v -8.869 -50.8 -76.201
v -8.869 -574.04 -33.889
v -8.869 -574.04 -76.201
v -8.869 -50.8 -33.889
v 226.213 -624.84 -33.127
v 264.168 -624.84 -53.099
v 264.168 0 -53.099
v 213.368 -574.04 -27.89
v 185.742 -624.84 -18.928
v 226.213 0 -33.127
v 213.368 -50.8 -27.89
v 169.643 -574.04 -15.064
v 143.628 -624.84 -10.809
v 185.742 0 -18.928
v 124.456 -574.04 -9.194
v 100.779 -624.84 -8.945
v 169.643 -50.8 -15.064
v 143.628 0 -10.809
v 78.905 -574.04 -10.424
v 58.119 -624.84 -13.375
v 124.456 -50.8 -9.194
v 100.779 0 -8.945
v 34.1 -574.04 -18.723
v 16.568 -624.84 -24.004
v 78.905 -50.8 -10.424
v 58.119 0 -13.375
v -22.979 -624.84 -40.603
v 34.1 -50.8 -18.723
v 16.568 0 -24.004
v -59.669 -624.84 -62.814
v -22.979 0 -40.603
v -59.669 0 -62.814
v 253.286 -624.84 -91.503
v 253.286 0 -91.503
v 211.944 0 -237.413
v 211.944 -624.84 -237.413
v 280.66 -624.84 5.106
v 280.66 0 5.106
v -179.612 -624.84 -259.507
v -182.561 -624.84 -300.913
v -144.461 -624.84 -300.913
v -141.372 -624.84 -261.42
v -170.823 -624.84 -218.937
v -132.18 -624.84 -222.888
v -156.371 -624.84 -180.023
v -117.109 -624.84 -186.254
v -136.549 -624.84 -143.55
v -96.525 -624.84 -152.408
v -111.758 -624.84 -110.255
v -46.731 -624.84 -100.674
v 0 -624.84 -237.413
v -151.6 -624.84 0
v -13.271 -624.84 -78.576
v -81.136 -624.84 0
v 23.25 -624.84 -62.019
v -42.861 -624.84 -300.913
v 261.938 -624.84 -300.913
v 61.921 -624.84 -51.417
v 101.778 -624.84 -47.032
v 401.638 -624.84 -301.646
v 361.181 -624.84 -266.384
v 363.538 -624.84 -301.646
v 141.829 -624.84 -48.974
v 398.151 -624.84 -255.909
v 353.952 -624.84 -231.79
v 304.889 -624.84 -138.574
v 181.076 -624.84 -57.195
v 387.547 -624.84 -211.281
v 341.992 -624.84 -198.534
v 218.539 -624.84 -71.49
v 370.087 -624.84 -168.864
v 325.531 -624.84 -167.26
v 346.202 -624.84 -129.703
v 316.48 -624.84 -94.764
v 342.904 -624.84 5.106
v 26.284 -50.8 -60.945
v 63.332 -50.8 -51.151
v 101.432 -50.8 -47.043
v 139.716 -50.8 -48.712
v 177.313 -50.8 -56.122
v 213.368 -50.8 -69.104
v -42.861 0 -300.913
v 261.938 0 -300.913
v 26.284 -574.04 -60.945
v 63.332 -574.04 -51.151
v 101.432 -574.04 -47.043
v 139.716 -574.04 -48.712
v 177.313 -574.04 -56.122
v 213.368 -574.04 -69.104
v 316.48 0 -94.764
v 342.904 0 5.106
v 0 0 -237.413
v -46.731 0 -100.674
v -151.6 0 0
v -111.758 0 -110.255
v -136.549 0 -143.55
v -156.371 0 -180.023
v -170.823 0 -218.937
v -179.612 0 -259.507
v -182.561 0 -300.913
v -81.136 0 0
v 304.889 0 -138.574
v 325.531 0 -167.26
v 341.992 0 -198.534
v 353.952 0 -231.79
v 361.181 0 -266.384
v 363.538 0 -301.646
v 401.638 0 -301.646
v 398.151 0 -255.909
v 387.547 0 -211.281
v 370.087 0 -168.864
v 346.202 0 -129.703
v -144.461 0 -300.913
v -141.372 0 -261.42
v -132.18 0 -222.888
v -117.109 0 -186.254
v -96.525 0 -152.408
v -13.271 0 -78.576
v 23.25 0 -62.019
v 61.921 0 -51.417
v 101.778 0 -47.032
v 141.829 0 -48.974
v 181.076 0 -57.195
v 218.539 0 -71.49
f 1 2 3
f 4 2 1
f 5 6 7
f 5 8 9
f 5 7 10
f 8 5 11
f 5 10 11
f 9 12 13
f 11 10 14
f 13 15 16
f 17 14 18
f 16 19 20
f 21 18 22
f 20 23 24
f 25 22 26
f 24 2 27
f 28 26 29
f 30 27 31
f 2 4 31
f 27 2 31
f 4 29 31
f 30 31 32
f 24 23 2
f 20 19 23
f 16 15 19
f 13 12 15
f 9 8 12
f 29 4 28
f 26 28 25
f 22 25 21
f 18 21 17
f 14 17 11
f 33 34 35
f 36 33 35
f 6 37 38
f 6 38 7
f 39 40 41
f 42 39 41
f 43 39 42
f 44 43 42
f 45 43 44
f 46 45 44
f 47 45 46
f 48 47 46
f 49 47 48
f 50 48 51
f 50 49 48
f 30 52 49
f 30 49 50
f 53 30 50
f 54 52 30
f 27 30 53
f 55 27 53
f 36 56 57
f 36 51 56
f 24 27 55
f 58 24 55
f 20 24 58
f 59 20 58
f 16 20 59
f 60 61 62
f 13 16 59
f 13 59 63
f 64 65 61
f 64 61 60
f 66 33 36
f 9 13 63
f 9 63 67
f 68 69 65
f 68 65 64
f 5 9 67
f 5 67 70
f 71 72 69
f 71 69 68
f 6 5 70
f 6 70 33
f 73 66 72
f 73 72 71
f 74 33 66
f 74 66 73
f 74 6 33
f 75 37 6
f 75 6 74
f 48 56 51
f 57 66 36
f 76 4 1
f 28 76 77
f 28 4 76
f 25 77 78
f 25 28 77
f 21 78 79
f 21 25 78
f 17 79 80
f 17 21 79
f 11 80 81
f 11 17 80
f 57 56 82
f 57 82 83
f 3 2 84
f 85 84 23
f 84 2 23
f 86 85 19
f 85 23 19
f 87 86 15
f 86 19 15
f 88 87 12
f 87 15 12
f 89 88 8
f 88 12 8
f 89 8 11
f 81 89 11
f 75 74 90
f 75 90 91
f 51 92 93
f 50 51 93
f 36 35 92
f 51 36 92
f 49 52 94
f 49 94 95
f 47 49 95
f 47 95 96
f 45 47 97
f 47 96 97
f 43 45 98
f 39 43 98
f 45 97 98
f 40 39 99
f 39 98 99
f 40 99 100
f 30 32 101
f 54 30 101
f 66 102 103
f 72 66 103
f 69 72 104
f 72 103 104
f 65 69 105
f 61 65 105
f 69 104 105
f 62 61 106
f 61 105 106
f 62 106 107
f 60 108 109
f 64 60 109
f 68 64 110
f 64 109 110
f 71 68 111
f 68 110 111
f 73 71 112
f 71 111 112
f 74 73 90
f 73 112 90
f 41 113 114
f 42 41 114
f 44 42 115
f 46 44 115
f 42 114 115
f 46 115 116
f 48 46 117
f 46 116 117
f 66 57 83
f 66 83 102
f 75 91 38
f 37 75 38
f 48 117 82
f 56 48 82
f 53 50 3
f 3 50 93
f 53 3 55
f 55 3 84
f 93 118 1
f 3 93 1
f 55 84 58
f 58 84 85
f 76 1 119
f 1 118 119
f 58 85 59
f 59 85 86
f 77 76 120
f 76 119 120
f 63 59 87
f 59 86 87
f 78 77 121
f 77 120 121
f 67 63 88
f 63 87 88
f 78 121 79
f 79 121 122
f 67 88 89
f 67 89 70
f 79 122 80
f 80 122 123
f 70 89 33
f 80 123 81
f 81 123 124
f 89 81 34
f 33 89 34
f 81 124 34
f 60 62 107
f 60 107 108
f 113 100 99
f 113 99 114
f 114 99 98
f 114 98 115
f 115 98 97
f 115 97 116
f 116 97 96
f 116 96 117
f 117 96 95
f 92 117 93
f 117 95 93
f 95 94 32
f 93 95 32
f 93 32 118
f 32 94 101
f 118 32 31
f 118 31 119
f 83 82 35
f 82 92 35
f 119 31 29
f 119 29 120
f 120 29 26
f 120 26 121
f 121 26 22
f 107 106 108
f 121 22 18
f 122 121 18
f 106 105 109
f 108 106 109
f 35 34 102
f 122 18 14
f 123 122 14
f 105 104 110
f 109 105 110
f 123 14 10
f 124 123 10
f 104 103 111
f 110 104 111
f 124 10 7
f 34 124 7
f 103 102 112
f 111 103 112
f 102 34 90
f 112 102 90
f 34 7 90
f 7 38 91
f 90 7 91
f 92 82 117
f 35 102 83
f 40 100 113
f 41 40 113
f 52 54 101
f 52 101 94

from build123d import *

# Parameters (mm, degrees)
F1_DEPTH = 624.84
F3_DEPTH = 624.84
F4_W     = 222.237472
F4_H     = 523.24
F5_DEPTH = 99.06


with BuildPart() as f1:
    # F0 (on Front) → F1 (new body)
    with BuildSketch(Plane.XZ):
        with BuildLine():
            Line((363.537534, -301.646389), (401.637534, -301.646389))
            ThreePointArc((401.637534, -301.646389), (109.905185, -8.813365), (-182.561408, -300.913066))
            Line((-182.561408, -300.913066), (-144.461408, -300.913066))
            ThreePointArc((-144.461408, -300.913066), (109.905254, -46.913399), (363.537534, -301.646389))
        make_face()
    extrude(amount=F1_DEPTH)

    # F2 (on face) → F3 (join)
    with BuildSketch(Plane.XZ.offset(624.84)):
        Polygon((-42.861408, -300.913399), (261.937534, -300.913399), (342.903882, 5.106361), (280.660063, 5.106361), (211.943924, -237.413399), (0, -237.413399), (-81.136086, 0), (-151.599751, 0), align=None)
    extrude(amount=-F3_DEPTH)

    # F4 (on face) → F5 (cut)
    with BuildSketch(Plane.XY.offset(5.106361)):
        with Locations((102.249414, -312.42)):
            Rectangle(F4_W, F4_H)
    extrude(amount=-F5_DEPTH, mode=Mode.SUBTRACT)


solid = f1.part
